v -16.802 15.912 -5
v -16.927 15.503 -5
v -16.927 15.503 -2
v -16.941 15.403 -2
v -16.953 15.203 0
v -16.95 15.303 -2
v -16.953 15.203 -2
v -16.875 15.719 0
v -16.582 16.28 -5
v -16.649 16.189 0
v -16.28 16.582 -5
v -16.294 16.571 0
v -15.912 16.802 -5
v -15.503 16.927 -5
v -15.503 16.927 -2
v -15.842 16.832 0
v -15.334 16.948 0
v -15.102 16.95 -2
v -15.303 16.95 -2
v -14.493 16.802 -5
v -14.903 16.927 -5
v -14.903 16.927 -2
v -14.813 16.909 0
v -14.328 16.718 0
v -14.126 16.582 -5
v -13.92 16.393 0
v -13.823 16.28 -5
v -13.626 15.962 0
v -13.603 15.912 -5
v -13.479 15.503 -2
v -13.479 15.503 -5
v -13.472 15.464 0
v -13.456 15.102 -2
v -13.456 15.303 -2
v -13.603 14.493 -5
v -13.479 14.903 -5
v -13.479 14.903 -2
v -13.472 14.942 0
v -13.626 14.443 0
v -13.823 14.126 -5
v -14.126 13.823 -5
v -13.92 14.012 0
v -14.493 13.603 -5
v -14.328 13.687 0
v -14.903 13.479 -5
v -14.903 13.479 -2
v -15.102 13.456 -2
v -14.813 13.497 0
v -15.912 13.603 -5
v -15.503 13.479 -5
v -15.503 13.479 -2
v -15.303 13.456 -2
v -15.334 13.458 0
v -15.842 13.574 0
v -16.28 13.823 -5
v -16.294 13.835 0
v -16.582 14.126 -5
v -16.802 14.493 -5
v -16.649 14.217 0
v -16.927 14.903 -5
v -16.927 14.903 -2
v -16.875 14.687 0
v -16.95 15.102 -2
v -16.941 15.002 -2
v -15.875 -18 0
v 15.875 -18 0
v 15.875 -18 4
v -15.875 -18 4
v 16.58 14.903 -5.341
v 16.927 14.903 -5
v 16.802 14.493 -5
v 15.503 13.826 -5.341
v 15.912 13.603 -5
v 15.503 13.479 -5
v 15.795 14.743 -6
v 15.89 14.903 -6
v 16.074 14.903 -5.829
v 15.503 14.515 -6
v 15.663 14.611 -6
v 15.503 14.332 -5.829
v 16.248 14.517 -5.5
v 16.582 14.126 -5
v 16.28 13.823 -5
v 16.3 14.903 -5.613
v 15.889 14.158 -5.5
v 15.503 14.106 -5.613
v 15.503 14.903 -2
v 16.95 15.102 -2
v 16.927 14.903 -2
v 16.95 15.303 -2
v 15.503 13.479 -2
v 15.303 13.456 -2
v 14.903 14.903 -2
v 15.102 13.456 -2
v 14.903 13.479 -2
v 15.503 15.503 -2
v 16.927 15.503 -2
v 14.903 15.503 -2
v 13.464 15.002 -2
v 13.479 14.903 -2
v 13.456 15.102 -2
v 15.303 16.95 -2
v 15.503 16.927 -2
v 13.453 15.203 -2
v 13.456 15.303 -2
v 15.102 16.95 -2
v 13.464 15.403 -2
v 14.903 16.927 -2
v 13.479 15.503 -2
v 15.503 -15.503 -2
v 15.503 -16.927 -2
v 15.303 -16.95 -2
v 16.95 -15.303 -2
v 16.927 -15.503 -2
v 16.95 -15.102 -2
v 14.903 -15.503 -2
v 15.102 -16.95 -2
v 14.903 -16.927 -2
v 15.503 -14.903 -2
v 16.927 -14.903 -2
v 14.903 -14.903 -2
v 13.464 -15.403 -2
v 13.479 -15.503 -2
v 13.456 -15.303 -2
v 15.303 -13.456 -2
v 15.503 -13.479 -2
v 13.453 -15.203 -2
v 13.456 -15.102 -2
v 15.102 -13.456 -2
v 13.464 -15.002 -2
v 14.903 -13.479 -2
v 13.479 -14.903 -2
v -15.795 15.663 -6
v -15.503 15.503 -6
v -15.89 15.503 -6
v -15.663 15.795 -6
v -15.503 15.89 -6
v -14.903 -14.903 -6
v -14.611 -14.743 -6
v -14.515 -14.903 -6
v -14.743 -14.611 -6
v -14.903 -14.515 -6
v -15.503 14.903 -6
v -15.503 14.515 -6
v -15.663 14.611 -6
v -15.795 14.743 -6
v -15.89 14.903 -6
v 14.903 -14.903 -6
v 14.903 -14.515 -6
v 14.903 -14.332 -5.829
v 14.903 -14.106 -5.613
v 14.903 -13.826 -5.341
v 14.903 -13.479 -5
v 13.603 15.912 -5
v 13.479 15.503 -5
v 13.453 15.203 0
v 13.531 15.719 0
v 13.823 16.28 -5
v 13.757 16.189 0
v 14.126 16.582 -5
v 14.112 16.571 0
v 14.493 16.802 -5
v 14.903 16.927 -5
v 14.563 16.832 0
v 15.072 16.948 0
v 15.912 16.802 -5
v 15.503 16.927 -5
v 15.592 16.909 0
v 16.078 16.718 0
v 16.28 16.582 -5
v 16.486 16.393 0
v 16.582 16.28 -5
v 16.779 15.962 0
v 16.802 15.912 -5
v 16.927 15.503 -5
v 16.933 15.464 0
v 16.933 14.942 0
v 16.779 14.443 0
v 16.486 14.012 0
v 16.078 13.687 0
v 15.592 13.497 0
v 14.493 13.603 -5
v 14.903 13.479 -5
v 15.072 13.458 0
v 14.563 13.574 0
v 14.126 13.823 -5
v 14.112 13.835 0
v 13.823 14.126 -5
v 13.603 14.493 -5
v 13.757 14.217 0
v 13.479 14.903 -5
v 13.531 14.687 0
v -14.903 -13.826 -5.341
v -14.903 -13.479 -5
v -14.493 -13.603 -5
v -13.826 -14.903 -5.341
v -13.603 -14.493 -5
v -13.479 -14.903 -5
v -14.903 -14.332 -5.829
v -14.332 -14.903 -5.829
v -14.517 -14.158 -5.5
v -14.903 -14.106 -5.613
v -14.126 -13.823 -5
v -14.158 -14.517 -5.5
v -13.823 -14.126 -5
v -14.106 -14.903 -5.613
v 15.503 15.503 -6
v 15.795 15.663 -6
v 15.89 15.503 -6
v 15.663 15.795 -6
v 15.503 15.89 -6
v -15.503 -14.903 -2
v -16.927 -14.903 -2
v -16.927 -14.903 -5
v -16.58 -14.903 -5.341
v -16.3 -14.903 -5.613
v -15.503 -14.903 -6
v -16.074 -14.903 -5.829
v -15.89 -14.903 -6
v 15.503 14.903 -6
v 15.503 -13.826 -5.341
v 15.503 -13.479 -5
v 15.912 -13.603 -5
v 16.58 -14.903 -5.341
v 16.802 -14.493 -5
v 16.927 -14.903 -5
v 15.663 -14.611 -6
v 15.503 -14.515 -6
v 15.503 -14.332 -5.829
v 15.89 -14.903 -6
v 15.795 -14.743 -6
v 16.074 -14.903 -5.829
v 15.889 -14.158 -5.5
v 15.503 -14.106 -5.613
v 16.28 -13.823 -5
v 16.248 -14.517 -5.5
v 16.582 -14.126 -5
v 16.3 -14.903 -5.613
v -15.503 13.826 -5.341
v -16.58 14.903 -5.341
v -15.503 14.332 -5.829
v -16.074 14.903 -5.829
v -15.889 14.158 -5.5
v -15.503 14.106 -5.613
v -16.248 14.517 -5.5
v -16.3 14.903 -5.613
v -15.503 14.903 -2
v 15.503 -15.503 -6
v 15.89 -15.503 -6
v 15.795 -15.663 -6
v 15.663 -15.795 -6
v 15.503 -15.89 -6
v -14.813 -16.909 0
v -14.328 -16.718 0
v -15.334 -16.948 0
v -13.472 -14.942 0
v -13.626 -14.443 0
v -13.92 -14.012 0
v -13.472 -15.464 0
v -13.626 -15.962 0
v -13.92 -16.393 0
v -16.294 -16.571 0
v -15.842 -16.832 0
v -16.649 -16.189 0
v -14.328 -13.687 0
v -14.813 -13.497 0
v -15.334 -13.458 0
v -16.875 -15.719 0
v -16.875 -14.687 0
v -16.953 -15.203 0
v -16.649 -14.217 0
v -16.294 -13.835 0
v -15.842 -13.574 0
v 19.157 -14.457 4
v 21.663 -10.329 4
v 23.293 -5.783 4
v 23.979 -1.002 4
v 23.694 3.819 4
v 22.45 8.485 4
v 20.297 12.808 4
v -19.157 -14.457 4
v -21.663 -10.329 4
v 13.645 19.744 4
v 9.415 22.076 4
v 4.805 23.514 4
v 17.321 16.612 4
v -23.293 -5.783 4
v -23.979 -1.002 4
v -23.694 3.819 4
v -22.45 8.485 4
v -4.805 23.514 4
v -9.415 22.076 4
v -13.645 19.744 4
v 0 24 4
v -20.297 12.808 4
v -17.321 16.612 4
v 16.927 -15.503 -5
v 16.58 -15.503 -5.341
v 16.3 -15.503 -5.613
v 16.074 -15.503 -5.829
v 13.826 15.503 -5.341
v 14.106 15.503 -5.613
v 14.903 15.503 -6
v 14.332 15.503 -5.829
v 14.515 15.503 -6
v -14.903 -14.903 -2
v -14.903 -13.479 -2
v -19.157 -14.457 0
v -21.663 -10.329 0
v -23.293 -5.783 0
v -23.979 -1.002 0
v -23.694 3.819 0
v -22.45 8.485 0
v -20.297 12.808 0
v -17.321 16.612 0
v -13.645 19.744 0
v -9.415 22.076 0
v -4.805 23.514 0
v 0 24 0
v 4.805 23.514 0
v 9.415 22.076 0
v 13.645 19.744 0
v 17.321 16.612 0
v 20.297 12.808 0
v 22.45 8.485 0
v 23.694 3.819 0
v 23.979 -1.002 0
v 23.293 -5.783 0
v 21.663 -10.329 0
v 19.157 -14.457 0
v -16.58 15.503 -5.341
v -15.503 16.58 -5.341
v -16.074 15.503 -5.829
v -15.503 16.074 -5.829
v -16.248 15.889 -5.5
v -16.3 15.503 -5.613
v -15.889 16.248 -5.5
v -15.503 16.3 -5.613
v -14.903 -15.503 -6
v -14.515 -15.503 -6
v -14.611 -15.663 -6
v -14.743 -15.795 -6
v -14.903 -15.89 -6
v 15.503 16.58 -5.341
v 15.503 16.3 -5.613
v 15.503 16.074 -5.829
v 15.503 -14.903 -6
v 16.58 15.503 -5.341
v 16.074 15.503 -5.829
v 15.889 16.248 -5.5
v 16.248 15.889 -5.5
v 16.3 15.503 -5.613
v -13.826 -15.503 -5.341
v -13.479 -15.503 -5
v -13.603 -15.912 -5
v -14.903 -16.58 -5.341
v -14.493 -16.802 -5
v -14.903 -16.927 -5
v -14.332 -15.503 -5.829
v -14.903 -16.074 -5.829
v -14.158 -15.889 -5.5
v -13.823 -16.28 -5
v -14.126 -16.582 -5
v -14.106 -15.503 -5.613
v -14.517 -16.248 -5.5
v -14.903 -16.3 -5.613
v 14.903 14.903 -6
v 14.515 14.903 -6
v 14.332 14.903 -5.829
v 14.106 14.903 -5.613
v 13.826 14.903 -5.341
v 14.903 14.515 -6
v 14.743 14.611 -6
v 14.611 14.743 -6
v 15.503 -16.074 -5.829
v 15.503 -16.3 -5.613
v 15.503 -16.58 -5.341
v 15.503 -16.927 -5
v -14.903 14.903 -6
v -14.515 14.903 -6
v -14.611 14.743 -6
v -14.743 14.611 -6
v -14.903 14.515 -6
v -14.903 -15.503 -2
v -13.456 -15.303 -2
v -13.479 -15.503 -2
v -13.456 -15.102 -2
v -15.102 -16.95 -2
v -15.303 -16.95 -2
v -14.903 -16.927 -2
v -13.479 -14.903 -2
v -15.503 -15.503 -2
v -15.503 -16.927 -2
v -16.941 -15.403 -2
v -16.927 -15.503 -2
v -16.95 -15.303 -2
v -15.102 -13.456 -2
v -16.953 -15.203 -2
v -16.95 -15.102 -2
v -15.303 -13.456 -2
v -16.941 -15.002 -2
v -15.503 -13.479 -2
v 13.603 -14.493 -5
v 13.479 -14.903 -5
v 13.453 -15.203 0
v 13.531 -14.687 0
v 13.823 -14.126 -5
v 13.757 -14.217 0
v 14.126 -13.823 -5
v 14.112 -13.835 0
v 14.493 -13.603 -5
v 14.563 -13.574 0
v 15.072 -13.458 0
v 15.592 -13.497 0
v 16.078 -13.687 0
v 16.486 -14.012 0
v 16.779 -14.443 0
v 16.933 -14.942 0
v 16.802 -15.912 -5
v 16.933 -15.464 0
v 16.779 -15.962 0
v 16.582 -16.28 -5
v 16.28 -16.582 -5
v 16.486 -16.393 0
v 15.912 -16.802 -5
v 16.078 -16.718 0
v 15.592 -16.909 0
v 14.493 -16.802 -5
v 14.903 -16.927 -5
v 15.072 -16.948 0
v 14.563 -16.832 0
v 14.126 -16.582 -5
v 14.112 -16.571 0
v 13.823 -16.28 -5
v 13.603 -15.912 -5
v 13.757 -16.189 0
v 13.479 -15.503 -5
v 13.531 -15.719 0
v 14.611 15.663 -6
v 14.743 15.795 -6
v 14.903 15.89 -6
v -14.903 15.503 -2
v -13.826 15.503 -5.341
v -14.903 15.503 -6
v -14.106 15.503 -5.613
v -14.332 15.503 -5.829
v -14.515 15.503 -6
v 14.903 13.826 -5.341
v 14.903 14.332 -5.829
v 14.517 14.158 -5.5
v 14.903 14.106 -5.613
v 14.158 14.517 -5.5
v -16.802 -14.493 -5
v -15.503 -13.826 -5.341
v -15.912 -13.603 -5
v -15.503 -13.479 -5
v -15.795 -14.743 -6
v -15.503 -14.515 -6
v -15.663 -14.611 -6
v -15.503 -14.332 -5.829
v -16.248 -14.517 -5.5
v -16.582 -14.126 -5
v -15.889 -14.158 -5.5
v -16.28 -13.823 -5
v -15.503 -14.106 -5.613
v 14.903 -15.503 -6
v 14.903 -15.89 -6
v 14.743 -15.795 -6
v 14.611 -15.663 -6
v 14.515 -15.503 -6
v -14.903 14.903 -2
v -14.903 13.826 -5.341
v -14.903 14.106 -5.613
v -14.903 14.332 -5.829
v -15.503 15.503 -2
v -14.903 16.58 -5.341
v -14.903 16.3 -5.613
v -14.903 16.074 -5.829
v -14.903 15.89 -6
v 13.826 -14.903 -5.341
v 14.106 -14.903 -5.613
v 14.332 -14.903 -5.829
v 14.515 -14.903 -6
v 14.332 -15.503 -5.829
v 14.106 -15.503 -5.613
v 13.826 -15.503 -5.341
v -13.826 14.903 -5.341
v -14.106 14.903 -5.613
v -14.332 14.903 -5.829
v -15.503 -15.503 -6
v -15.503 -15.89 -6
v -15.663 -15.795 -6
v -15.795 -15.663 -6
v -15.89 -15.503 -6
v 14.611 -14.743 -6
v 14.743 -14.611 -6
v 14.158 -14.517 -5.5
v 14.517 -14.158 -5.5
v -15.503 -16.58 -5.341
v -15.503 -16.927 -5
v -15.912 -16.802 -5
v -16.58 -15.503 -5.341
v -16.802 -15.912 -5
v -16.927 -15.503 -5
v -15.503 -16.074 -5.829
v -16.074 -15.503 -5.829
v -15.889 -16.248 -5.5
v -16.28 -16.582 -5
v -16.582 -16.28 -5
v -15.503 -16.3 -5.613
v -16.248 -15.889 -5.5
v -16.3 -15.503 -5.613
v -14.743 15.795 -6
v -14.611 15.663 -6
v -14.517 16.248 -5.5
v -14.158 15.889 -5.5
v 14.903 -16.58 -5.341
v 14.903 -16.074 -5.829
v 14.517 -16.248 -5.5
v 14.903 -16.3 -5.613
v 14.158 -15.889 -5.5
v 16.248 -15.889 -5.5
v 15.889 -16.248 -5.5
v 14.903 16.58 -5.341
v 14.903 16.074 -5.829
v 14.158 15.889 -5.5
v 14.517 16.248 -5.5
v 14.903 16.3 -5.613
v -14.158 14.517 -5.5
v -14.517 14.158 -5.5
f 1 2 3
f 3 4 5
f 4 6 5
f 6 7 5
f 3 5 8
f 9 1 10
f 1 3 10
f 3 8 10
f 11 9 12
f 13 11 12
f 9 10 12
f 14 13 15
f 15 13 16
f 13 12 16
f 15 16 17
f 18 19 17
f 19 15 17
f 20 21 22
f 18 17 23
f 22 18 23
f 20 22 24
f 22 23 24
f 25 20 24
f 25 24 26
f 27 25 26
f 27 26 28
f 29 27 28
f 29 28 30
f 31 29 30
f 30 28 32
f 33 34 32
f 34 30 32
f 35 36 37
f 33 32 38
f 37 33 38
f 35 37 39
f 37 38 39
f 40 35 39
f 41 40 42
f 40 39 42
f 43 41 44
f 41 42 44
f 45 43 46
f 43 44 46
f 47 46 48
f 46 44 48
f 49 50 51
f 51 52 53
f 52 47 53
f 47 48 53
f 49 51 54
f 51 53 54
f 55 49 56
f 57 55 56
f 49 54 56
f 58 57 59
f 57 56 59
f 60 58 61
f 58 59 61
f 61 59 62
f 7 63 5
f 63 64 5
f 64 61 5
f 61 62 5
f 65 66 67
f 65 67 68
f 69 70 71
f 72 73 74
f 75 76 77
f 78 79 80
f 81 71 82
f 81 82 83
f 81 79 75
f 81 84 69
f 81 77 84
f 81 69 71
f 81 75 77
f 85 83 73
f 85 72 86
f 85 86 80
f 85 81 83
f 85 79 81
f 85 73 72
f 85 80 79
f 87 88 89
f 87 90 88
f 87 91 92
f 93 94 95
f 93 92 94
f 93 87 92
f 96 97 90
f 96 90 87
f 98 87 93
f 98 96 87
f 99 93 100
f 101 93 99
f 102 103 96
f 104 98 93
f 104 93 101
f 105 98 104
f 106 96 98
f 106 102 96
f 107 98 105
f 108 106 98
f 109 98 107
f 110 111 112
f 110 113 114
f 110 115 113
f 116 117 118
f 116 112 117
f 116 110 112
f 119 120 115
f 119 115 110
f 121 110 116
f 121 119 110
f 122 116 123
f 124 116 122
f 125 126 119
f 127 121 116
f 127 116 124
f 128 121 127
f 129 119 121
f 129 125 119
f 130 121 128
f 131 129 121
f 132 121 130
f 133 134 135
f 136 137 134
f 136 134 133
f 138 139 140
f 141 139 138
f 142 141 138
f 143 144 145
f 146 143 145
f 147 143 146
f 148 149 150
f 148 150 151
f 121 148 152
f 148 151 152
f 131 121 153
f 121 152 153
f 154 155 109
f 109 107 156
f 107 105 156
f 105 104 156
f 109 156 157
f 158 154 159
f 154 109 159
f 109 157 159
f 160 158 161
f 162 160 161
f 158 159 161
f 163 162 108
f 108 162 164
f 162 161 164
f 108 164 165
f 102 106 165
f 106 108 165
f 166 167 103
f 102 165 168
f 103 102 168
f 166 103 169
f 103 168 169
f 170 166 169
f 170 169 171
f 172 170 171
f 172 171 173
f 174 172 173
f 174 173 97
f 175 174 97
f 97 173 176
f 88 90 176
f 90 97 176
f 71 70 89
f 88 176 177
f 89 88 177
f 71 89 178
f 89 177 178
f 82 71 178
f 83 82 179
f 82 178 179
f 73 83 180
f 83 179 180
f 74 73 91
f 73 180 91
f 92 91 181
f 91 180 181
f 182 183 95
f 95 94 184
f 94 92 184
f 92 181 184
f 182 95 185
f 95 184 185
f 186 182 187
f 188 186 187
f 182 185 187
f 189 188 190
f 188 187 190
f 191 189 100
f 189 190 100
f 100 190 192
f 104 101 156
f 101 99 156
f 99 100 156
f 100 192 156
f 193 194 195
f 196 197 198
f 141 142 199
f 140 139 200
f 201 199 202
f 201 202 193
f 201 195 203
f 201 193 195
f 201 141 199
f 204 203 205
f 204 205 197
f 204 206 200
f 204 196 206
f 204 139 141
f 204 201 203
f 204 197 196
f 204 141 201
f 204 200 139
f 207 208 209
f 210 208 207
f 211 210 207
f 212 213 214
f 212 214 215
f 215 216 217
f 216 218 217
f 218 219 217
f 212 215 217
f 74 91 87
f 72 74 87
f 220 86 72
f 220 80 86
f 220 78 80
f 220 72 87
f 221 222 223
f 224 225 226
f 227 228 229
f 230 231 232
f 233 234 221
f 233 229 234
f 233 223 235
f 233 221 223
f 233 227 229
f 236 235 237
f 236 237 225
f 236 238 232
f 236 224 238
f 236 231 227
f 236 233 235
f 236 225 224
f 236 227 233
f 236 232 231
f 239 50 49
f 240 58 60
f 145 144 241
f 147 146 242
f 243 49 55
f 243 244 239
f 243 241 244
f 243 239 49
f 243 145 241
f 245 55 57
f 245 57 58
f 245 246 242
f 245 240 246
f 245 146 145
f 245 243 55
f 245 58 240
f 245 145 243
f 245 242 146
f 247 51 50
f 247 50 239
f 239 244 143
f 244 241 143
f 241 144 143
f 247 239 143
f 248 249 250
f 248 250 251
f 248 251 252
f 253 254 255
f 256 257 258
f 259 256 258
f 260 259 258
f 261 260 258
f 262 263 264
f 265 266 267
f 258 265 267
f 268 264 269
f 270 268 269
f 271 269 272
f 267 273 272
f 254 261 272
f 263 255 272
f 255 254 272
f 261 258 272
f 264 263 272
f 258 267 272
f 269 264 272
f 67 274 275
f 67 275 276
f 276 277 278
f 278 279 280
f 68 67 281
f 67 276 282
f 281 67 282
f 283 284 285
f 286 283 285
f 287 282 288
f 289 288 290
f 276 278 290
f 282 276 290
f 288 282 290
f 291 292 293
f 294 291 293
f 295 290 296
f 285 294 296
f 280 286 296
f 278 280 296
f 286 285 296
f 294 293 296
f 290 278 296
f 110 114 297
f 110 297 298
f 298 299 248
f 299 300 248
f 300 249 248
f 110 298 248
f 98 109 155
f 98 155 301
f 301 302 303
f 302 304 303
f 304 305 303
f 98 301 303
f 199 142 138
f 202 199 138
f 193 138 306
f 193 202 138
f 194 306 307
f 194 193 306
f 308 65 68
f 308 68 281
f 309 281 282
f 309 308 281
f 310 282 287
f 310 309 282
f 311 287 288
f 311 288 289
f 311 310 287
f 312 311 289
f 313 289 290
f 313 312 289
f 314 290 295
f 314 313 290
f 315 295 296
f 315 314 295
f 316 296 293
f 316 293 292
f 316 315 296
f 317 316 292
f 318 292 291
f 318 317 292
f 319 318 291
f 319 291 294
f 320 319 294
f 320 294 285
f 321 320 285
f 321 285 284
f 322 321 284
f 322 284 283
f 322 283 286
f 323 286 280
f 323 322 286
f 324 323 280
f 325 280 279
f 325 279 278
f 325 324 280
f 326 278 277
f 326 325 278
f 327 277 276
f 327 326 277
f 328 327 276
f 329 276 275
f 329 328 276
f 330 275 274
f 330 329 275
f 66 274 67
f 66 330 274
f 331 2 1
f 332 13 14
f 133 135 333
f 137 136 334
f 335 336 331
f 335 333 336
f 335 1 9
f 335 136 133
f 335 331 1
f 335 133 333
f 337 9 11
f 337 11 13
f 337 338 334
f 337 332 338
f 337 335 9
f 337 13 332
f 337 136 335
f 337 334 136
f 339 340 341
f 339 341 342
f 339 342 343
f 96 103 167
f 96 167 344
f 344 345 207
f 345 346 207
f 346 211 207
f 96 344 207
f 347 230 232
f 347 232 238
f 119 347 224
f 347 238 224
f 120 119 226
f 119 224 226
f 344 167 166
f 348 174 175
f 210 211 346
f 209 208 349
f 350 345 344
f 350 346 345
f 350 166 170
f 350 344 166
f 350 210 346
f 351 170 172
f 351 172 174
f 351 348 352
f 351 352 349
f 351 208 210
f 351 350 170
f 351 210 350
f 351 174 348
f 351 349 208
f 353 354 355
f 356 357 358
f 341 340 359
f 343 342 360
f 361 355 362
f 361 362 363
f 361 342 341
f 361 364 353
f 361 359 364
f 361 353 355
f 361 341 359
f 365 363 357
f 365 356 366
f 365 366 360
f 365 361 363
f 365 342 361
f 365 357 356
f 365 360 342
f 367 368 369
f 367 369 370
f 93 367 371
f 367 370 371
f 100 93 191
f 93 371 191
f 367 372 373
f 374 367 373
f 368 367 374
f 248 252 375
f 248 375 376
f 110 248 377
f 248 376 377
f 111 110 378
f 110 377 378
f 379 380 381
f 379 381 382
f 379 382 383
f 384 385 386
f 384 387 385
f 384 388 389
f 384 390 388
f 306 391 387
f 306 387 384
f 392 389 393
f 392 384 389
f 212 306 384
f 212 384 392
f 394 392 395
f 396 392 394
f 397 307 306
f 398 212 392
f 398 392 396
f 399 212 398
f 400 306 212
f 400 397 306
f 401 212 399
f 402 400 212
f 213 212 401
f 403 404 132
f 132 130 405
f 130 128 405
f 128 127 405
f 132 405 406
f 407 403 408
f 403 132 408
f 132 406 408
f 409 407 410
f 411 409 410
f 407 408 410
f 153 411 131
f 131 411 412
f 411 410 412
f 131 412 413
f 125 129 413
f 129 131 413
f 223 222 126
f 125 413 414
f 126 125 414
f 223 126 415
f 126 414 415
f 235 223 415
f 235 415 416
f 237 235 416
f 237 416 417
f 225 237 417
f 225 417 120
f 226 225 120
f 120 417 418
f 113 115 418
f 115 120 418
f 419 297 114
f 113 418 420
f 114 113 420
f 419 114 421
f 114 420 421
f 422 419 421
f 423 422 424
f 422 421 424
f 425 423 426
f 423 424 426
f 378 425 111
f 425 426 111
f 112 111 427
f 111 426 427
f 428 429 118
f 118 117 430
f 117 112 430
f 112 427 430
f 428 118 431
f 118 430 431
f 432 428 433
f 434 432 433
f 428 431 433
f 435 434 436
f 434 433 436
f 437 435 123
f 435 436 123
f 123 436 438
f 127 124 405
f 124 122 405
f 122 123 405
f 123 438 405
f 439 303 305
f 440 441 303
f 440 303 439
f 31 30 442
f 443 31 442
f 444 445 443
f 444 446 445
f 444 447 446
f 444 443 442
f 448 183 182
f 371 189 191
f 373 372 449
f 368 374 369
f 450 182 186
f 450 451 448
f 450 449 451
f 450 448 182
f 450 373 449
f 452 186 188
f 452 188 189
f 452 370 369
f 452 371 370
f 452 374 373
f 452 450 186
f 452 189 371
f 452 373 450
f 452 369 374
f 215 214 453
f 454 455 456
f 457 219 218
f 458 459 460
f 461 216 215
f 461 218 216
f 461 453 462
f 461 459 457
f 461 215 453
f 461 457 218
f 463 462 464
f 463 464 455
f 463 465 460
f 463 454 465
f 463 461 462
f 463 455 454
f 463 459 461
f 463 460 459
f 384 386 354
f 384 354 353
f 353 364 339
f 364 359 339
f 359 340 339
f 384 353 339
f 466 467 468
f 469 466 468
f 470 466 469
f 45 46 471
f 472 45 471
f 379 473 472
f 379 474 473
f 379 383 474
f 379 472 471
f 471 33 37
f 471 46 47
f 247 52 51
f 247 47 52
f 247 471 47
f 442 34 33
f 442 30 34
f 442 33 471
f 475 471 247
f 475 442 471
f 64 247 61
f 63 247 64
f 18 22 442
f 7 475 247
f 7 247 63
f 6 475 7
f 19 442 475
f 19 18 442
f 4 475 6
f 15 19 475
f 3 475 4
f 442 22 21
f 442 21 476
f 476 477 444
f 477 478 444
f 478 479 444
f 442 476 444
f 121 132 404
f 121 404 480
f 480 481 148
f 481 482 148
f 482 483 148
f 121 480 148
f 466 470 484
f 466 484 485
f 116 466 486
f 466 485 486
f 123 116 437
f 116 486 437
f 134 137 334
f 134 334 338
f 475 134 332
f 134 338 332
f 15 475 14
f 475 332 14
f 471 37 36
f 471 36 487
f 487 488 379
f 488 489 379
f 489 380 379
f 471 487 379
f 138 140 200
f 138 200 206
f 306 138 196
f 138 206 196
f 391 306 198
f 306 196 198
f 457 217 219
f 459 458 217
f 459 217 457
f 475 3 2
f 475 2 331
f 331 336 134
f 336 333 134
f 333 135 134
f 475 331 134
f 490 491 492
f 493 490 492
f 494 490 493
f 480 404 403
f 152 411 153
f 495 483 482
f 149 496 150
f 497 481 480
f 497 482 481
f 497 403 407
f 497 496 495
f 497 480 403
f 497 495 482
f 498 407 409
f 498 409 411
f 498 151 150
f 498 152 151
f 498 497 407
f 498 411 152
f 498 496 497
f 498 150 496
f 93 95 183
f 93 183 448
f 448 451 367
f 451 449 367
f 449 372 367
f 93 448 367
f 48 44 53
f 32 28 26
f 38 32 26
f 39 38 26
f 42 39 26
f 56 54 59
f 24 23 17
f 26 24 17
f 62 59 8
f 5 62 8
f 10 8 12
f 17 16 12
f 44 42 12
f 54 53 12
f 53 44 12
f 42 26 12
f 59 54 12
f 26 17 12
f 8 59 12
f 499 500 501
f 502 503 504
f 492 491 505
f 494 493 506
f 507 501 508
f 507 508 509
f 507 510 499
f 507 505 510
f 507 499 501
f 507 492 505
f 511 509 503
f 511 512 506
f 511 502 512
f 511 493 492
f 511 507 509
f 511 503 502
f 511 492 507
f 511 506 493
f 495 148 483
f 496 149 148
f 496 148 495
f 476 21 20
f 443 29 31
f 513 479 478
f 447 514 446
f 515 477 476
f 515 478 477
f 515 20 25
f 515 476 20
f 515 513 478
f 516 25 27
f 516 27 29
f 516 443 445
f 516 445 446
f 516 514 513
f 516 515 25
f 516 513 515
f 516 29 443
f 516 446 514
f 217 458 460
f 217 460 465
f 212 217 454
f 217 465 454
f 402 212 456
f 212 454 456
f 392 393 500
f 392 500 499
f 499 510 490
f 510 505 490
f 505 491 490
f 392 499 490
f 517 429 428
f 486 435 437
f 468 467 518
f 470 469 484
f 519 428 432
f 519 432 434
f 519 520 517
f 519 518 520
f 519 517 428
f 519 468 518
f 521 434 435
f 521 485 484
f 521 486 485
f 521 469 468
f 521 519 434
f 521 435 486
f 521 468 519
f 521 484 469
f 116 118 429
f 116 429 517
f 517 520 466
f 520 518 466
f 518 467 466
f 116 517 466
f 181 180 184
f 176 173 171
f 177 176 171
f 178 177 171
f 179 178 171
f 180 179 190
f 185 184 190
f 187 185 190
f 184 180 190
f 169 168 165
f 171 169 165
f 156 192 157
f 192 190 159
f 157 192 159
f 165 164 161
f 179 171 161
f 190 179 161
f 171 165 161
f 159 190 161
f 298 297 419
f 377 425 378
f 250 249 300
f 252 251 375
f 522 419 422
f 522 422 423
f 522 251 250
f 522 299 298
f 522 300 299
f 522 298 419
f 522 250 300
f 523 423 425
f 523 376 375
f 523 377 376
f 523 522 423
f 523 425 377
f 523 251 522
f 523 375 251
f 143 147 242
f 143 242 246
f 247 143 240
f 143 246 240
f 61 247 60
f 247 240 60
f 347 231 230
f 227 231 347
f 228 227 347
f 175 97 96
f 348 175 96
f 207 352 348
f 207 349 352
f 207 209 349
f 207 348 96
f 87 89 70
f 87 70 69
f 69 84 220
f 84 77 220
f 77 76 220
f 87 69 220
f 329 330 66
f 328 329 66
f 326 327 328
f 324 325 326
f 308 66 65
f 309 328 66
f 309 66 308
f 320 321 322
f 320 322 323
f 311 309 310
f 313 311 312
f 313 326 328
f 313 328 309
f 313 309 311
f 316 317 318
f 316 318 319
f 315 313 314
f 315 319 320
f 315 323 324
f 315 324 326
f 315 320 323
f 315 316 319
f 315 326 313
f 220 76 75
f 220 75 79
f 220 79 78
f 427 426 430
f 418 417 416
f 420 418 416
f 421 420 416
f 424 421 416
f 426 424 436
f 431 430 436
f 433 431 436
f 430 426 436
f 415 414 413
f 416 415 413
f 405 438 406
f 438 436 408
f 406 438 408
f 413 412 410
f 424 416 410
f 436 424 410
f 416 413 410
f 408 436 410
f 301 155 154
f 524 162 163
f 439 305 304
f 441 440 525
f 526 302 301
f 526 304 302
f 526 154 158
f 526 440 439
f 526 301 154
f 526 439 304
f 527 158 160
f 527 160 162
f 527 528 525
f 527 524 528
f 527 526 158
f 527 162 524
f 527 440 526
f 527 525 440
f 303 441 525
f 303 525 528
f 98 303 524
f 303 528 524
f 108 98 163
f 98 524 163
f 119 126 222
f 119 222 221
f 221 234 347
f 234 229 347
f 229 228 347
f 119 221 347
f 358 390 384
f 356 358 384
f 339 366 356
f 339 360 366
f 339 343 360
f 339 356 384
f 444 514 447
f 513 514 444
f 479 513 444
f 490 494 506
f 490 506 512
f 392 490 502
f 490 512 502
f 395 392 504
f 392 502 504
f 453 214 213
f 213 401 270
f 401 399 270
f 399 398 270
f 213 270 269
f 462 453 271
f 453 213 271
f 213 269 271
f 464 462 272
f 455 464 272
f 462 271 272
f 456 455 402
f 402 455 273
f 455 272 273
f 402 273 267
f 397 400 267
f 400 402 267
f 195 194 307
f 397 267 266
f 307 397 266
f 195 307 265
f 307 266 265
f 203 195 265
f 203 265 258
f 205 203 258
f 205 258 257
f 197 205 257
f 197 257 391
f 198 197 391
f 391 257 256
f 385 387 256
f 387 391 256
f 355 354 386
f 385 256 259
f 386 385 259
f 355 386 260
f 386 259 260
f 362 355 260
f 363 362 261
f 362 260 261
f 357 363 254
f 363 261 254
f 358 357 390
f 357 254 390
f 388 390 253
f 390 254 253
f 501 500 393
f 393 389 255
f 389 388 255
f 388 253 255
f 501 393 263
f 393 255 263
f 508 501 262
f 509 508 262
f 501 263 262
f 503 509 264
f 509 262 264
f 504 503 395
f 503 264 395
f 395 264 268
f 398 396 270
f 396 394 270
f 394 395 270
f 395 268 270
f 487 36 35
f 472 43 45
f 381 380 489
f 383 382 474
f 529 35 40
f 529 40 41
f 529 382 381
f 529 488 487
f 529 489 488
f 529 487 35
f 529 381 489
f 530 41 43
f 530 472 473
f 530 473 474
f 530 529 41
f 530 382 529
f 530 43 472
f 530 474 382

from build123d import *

# Parameters (mm, degrees)
BOSS_EXTRUDE1_DEPTH   = 4
SKETCH3_R             = 1.75
BOSS_EXTRUDE2_DEPTH   = 6
BOSS_EXTRUDE2_2_DEPTH = 6
BOSS_EXTRUDE2_3_DEPTH = 6
BOSS_EXTRUDE2_4_DEPTH = 6
CHAMFER1_SIZE         = 1
CHAMFER2_SIZE         = 1
CHAMFER3_SIZE         = 1
CHAMFER4_SIZE         = 1
SKETCH4_W             = 0.6
SKETCH4_H             = 0.6
SKETCH4_W_2           = 1.7
SKETCH4_H_2           = 1.7
CUT_EXTRUDE1_DEPTH    = 4


with BuildPart() as part:
    # Sketch1 → Boss-Extrude1 (new body)
    with BuildSketch(Plane.XY):
        with BuildLine():
            Line((15.874507866, -18), (-15.874507866, -18))
            ThreePointArc((-15.874507866, -18), (0, 24), (15.874507866, -18))
        make_face()
    extrude(amount=BOSS_EXTRUDE1_DEPTH)


with BuildPart() as body_2:
    # Sketch3 → Boss-Extrude2 (new body)
    with BuildSketch(Plane(origin=(0, 0, 0), x_dir=(-1, 0, 0), z_dir=(0, 0, -1))):
        with Locations((-15.202795796, -15.202795796)):
            Circle(SKETCH3_R)
    extrude(amount=BOSS_EXTRUDE2_DEPTH)

    # Chamfer2
    chamfer2_edges = [body_2.edges().sort_by_distance(p)[0] for p in [
        (16.952795796, -15.202795796, -6),
    ]]
    chamfer(chamfer2_edges, length=CHAMFER2_SIZE)


with BuildPart() as body_3:
    # Sketch3 → Boss-Extrude2 2 (new body)
    with BuildSketch(Plane(origin=(0, 0, 0), x_dir=(-1, 0, 0), z_dir=(0, 0, -1))):
        with Locations((15.202795796, -15.202795796)):
            Circle(SKETCH3_R)
    extrude(amount=BOSS_EXTRUDE2_2_DEPTH)

    # Chamfer4
    chamfer4_edges = [body_3.edges().sort_by_distance(p)[0] for p in [
        (-13.452795796, -15.202795796, -6),
    ]]
    chamfer(chamfer4_edges, length=CHAMFER4_SIZE)


with BuildPart() as body_4:
    # Sketch3 → Boss-Extrude2 3 (new body)
    with BuildSketch(Plane(origin=(0, 0, 0), x_dir=(-1, 0, 0), z_dir=(0, 0, -1))):
        with Locations((15.202795796, 15.202795796)):
            Circle(SKETCH3_R)
    extrude(amount=BOSS_EXTRUDE2_3_DEPTH)

    # Chamfer3
    chamfer3_edges = [body_4.edges().sort_by_distance(p)[0] for p in [
        (-13.452795796, 15.202795796, -6),
    ]]
    chamfer(chamfer3_edges, length=CHAMFER3_SIZE)


with BuildPart() as body_5:
    # Sketch3 → Boss-Extrude2 4 (new body)
    with BuildSketch(Plane(origin=(0, 0, 0), x_dir=(-1, 0, 0), z_dir=(0, 0, -1))):
        with Locations((-15.202795796, 15.202795796)):
            Circle(SKETCH3_R)
    extrude(amount=BOSS_EXTRUDE2_4_DEPTH)

    # Chamfer1
    chamfer1_edges = [body_5.edges().sort_by_distance(p)[0] for p in [
        (16.952795796, 15.202795796, -6),
    ]]
    chamfer(chamfer1_edges, length=CHAMFER1_SIZE)


with BuildPart() as cut_extrude1_tool:
    # Sketch4 → Cut-Extrude1 (new body)
    with BuildSketch(Plane(origin=(0, 0, -6), x_dir=(-1, 0, 0), z_dir=(0, 0, -1))):
        with Locations((15.202795796, -15.202795796)):
            Rectangle(SKETCH4_W, SKETCH4_H)
        with Locations((16.352795796, -15.202795796)):
            Rectangle(SKETCH4_W_2, SKETCH4_H)
        with Locations((14.052795796, -15.202795796)):
            Rectangle(SKETCH4_W_2, SKETCH4_H)
        with Locations((15.202795796, -14.052795796)):
            Rectangle(SKETCH4_W, SKETCH4_H_2)
        with Locations((15.202795796, -16.352795796)):
            Rectangle(SKETCH4_W, SKETCH4_H_2)
        with Locations((-15.202795796, -15.202795796)):
            Rectangle(SKETCH4_W, SKETCH4_H)
        with BuildLine():
            Line((-14.515409441, -14.902795796), (-14.902795796, -14.902795796))
            Line((-14.902795796, -14.902795796), (-14.902795796, -15.502795796))
            Line((-14.902795796, -15.502795796), (-14.515409441, -15.502795796))
            ThreePointArc((-14.515409441, -15.502795796), (-14.468616061, -15.356028028), (-14.452795796, -15.202795796))
            ThreePointArc((-14.452795796, -15.202795796), (-14.468616061, -15.049563563), (-14.515409441, -14.902795796))
        make_face()
        with BuildLine():
            Line((-13.202795796, -14.902795796), (-14.515409441, -14.902795796))
            ThreePointArc((-14.515409441, -14.902795796), (-14.468616061, -15.049563563), (-14.452795796, -15.202795796))
            ThreePointArc((-14.452795796, -15.202795796), (-14.468616061, -15.356028028), (-14.515409441, -15.502795796))
            Line((-14.515409441, -15.502795796), (-13.202795796, -15.502795796))
            Line((-13.202795796, -15.502795796), (-13.202795796, -14.902795796))
        make_face()
        with BuildLine():
            Line((-14.902795796, -15.502795796), (-15.502795796, -15.502795796))
            Line((-15.502795796, -15.502795796), (-15.502795796, -15.89018215))
            ThreePointArc((-15.502795796, -15.89018215), (-15.202795796, -15.952795796), (-14.902795796, -15.89018215))
            Line((-14.902795796, -15.89018215), (-14.902795796, -15.502795796))
        make_face()
        with BuildLine():
            ThreePointArc((-14.902795796, -15.89018215), (-15.202795796, -15.952795796), (-15.502795796, -15.89018215))
            Line((-15.502795796, -15.89018215), (-15.502795796, -17.202795796))
            Line((-15.502795796, -17.202795796), (-14.902795796, -17.202795796))
            Line((-14.902795796, -17.202795796), (-14.902795796, -15.89018215))
        make_face()
        with BuildLine():
            Line((-15.502795796, -15.502795796), (-15.502795796, -14.902795796))
            Line((-15.502795796, -14.902795796), (-15.89018215, -14.902795796))
            ThreePointArc((-15.89018215, -14.902795796), (-15.952795796, -15.202795796), (-15.89018215, -15.502795796))
            Line((-15.89018215, -15.502795796), (-15.502795796, -15.502795796))
        make_face()
        with BuildLine():
            ThreePointArc((-15.89018215, -15.502795796), (-15.952795796, -15.202795796), (-15.89018215, -14.902795796))
            Line((-15.89018215, -14.902795796), (-17.202795796, -14.902795796))
            Line((-17.202795796, -14.902795796), (-17.202795796, -15.502795796))
            Line((-17.202795796, -15.502795796), (-15.89018215, -15.502795796))
        make_face()
        with BuildLine():
            ThreePointArc((-14.902795796, -14.515409441), (-15.202795796, -14.452795796), (-15.502795796, -14.515409441))
            Line((-15.502795796, -14.515409441), (-15.502795796, -14.902795796))
            Line((-15.502795796, -14.902795796), (-14.902795796, -14.902795796))
            Line((-14.902795796, -14.902795796), (-14.902795796, -14.515409441))
        make_face()
        with BuildLine():
            Line((-14.902795796, -13.202795796), (-15.502795796, -13.202795796))
            Line((-15.502795796, -13.202795796), (-15.502795796, -14.515409441))
            ThreePointArc((-15.502795796, -14.515409441), (-15.202795796, -14.452795796), (-14.902795796, -14.515409441))
            Line((-14.902795796, -14.515409441), (-14.902795796, -13.202795796))
        make_face()
        with Locations((15.202795796, 15.202795796)):
            Rectangle(SKETCH4_W, SKETCH4_H)
        with Locations((16.352795796, 15.202795796)):
            Rectangle(SKETCH4_W_2, SKETCH4_H)
        with Locations((15.202795796, 16.352795796)):
            Rectangle(SKETCH4_W, SKETCH4_H_2)
        with Locations((14.052795796, 15.202795796)):
            Rectangle(SKETCH4_W_2, SKETCH4_H)
        with Locations((15.202795796, 14.052795796)):
            Rectangle(SKETCH4_W, SKETCH4_H_2)
        with Locations((-15.202795796, 15.202795796)):
            Rectangle(SKETCH4_W, SKETCH4_H)
        with Locations((-14.052795796, 15.202795796)):
            Rectangle(SKETCH4_W_2, SKETCH4_H)
        with Locations((-15.202795796, 16.352795796)):
            Rectangle(SKETCH4_W, SKETCH4_H_2)
        with Locations((-16.352795796, 15.202795796)):
            Rectangle(SKETCH4_W_2, SKETCH4_H)
        with Locations((-15.202795796, 14.052795796)):
            Rectangle(SKETCH4_W, SKETCH4_H_2)
    extrude(amount=-CUT_EXTRUDE1_DEPTH)


with BuildPart() as body_2_1:
    add(body_2.part)

    # Cut-Extrude1: cut by cut_extrude1_tool
    add(cut_extrude1_tool.part, mode=Mode.SUBTRACT)


with BuildPart() as body_3_1:
    add(body_3.part)

    # Cut-Extrude1: cut by cut_extrude1_tool
    add(cut_extrude1_tool.part, mode=Mode.SUBTRACT)


with BuildPart() as body_4_1:
    add(body_4.part)

    # Cut-Extrude1: cut by cut_extrude1_tool
    add(cut_extrude1_tool.part, mode=Mode.SUBTRACT)


with BuildPart() as body_5_1:
    add(body_5.part)

    # Cut-Extrude1: cut by cut_extrude1_tool
    add(cut_extrude1_tool.part, mode=Mode.SUBTRACT)


solid = Compound([part.part, body_2_1.part, body_3_1.part, body_4_1.part, body_5_1.part])
